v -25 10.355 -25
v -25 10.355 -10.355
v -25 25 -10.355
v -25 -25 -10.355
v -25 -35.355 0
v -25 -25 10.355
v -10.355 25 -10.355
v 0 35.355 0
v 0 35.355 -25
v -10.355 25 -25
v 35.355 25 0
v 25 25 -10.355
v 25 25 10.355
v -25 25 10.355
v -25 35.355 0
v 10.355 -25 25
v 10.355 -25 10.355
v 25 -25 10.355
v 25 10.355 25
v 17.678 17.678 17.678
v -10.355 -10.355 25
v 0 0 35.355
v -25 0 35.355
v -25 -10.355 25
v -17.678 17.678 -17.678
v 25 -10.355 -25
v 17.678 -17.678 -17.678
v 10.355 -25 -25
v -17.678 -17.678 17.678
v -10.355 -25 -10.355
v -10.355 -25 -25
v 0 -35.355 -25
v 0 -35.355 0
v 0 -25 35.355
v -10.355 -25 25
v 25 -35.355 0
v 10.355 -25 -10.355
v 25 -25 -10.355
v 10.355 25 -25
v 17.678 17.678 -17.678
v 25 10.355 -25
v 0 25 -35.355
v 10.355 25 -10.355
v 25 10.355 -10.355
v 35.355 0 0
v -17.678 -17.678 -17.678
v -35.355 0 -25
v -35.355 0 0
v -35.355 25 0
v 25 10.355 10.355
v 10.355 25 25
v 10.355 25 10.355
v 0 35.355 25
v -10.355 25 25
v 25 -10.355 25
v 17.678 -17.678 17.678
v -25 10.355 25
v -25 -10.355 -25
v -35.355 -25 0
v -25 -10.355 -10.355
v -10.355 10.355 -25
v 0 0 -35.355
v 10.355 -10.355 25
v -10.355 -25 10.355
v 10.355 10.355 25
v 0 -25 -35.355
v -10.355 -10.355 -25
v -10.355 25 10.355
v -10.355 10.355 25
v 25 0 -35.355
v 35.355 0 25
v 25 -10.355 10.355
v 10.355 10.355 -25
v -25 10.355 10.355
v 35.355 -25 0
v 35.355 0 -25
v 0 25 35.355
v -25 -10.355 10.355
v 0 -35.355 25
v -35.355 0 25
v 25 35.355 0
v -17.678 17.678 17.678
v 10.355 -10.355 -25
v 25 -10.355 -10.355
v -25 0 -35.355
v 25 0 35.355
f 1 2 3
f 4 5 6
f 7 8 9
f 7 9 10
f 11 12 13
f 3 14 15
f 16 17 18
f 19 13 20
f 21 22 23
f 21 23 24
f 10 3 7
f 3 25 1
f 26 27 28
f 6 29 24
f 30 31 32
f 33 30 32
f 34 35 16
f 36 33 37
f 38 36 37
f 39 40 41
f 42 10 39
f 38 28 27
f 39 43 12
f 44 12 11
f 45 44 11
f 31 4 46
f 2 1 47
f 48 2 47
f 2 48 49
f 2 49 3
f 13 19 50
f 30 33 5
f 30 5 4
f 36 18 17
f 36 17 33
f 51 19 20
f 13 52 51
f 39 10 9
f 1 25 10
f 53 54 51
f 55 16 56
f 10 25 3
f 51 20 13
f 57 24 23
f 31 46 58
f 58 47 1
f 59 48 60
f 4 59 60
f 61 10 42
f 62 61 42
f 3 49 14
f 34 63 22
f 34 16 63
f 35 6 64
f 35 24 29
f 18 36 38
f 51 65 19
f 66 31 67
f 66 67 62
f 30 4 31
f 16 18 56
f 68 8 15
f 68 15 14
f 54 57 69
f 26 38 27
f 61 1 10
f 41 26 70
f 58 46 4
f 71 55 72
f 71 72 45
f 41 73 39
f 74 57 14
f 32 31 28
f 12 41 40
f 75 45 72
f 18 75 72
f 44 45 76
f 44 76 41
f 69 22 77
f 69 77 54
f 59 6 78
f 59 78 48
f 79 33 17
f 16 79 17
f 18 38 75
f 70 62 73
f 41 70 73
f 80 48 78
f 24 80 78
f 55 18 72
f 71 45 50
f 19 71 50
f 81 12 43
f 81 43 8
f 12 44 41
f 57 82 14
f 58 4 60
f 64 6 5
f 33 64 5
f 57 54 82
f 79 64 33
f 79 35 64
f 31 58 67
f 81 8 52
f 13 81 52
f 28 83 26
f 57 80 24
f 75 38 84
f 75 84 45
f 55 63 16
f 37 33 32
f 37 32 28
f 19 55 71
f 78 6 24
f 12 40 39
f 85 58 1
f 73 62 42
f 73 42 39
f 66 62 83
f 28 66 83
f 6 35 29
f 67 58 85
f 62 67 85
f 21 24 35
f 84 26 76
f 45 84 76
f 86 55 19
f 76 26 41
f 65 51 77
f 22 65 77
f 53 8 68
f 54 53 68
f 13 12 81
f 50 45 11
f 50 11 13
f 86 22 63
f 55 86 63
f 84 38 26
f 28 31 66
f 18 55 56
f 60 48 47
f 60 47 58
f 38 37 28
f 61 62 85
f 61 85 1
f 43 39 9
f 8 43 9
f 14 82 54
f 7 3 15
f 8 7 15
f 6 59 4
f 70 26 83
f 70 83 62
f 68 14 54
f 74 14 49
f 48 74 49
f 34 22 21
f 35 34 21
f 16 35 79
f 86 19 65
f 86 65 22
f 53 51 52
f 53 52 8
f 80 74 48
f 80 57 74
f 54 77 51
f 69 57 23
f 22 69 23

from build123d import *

# Parameters (mm, degrees)
F1_DEPTH = 25
F3_DEPTH = 25
F5_DEPTH = 25


with BuildPart() as f1:
    # F0 (on Front) → F1 (new body, symmetric)
    with BuildSketch(Plane.XZ):
        Polygon((35.355339, 0), (0, 35.355339), (-35.355339, 0), (0, -35.355339), align=None)
    extrude(amount=F1_DEPTH, both=True)

    # F2 (on Right) → F3 (join, symmetric)
    with BuildSketch(Plane.YZ):
        Polygon((35.355339, 0), (0, 35.355339), (-35.355339, 0), (0, -35.355339), align=None)
    extrude(amount=F3_DEPTH, both=True)

    # F4 (on Top) → F5 (join, symmetric)
    with BuildSketch(Plane.XY):
        Polygon((-35.355339, 0), (0, -35.355339), (35.355339, 0), (0, 35.355339), align=None)
    extrude(amount=F5_DEPTH, both=True)


solid = f1.part
